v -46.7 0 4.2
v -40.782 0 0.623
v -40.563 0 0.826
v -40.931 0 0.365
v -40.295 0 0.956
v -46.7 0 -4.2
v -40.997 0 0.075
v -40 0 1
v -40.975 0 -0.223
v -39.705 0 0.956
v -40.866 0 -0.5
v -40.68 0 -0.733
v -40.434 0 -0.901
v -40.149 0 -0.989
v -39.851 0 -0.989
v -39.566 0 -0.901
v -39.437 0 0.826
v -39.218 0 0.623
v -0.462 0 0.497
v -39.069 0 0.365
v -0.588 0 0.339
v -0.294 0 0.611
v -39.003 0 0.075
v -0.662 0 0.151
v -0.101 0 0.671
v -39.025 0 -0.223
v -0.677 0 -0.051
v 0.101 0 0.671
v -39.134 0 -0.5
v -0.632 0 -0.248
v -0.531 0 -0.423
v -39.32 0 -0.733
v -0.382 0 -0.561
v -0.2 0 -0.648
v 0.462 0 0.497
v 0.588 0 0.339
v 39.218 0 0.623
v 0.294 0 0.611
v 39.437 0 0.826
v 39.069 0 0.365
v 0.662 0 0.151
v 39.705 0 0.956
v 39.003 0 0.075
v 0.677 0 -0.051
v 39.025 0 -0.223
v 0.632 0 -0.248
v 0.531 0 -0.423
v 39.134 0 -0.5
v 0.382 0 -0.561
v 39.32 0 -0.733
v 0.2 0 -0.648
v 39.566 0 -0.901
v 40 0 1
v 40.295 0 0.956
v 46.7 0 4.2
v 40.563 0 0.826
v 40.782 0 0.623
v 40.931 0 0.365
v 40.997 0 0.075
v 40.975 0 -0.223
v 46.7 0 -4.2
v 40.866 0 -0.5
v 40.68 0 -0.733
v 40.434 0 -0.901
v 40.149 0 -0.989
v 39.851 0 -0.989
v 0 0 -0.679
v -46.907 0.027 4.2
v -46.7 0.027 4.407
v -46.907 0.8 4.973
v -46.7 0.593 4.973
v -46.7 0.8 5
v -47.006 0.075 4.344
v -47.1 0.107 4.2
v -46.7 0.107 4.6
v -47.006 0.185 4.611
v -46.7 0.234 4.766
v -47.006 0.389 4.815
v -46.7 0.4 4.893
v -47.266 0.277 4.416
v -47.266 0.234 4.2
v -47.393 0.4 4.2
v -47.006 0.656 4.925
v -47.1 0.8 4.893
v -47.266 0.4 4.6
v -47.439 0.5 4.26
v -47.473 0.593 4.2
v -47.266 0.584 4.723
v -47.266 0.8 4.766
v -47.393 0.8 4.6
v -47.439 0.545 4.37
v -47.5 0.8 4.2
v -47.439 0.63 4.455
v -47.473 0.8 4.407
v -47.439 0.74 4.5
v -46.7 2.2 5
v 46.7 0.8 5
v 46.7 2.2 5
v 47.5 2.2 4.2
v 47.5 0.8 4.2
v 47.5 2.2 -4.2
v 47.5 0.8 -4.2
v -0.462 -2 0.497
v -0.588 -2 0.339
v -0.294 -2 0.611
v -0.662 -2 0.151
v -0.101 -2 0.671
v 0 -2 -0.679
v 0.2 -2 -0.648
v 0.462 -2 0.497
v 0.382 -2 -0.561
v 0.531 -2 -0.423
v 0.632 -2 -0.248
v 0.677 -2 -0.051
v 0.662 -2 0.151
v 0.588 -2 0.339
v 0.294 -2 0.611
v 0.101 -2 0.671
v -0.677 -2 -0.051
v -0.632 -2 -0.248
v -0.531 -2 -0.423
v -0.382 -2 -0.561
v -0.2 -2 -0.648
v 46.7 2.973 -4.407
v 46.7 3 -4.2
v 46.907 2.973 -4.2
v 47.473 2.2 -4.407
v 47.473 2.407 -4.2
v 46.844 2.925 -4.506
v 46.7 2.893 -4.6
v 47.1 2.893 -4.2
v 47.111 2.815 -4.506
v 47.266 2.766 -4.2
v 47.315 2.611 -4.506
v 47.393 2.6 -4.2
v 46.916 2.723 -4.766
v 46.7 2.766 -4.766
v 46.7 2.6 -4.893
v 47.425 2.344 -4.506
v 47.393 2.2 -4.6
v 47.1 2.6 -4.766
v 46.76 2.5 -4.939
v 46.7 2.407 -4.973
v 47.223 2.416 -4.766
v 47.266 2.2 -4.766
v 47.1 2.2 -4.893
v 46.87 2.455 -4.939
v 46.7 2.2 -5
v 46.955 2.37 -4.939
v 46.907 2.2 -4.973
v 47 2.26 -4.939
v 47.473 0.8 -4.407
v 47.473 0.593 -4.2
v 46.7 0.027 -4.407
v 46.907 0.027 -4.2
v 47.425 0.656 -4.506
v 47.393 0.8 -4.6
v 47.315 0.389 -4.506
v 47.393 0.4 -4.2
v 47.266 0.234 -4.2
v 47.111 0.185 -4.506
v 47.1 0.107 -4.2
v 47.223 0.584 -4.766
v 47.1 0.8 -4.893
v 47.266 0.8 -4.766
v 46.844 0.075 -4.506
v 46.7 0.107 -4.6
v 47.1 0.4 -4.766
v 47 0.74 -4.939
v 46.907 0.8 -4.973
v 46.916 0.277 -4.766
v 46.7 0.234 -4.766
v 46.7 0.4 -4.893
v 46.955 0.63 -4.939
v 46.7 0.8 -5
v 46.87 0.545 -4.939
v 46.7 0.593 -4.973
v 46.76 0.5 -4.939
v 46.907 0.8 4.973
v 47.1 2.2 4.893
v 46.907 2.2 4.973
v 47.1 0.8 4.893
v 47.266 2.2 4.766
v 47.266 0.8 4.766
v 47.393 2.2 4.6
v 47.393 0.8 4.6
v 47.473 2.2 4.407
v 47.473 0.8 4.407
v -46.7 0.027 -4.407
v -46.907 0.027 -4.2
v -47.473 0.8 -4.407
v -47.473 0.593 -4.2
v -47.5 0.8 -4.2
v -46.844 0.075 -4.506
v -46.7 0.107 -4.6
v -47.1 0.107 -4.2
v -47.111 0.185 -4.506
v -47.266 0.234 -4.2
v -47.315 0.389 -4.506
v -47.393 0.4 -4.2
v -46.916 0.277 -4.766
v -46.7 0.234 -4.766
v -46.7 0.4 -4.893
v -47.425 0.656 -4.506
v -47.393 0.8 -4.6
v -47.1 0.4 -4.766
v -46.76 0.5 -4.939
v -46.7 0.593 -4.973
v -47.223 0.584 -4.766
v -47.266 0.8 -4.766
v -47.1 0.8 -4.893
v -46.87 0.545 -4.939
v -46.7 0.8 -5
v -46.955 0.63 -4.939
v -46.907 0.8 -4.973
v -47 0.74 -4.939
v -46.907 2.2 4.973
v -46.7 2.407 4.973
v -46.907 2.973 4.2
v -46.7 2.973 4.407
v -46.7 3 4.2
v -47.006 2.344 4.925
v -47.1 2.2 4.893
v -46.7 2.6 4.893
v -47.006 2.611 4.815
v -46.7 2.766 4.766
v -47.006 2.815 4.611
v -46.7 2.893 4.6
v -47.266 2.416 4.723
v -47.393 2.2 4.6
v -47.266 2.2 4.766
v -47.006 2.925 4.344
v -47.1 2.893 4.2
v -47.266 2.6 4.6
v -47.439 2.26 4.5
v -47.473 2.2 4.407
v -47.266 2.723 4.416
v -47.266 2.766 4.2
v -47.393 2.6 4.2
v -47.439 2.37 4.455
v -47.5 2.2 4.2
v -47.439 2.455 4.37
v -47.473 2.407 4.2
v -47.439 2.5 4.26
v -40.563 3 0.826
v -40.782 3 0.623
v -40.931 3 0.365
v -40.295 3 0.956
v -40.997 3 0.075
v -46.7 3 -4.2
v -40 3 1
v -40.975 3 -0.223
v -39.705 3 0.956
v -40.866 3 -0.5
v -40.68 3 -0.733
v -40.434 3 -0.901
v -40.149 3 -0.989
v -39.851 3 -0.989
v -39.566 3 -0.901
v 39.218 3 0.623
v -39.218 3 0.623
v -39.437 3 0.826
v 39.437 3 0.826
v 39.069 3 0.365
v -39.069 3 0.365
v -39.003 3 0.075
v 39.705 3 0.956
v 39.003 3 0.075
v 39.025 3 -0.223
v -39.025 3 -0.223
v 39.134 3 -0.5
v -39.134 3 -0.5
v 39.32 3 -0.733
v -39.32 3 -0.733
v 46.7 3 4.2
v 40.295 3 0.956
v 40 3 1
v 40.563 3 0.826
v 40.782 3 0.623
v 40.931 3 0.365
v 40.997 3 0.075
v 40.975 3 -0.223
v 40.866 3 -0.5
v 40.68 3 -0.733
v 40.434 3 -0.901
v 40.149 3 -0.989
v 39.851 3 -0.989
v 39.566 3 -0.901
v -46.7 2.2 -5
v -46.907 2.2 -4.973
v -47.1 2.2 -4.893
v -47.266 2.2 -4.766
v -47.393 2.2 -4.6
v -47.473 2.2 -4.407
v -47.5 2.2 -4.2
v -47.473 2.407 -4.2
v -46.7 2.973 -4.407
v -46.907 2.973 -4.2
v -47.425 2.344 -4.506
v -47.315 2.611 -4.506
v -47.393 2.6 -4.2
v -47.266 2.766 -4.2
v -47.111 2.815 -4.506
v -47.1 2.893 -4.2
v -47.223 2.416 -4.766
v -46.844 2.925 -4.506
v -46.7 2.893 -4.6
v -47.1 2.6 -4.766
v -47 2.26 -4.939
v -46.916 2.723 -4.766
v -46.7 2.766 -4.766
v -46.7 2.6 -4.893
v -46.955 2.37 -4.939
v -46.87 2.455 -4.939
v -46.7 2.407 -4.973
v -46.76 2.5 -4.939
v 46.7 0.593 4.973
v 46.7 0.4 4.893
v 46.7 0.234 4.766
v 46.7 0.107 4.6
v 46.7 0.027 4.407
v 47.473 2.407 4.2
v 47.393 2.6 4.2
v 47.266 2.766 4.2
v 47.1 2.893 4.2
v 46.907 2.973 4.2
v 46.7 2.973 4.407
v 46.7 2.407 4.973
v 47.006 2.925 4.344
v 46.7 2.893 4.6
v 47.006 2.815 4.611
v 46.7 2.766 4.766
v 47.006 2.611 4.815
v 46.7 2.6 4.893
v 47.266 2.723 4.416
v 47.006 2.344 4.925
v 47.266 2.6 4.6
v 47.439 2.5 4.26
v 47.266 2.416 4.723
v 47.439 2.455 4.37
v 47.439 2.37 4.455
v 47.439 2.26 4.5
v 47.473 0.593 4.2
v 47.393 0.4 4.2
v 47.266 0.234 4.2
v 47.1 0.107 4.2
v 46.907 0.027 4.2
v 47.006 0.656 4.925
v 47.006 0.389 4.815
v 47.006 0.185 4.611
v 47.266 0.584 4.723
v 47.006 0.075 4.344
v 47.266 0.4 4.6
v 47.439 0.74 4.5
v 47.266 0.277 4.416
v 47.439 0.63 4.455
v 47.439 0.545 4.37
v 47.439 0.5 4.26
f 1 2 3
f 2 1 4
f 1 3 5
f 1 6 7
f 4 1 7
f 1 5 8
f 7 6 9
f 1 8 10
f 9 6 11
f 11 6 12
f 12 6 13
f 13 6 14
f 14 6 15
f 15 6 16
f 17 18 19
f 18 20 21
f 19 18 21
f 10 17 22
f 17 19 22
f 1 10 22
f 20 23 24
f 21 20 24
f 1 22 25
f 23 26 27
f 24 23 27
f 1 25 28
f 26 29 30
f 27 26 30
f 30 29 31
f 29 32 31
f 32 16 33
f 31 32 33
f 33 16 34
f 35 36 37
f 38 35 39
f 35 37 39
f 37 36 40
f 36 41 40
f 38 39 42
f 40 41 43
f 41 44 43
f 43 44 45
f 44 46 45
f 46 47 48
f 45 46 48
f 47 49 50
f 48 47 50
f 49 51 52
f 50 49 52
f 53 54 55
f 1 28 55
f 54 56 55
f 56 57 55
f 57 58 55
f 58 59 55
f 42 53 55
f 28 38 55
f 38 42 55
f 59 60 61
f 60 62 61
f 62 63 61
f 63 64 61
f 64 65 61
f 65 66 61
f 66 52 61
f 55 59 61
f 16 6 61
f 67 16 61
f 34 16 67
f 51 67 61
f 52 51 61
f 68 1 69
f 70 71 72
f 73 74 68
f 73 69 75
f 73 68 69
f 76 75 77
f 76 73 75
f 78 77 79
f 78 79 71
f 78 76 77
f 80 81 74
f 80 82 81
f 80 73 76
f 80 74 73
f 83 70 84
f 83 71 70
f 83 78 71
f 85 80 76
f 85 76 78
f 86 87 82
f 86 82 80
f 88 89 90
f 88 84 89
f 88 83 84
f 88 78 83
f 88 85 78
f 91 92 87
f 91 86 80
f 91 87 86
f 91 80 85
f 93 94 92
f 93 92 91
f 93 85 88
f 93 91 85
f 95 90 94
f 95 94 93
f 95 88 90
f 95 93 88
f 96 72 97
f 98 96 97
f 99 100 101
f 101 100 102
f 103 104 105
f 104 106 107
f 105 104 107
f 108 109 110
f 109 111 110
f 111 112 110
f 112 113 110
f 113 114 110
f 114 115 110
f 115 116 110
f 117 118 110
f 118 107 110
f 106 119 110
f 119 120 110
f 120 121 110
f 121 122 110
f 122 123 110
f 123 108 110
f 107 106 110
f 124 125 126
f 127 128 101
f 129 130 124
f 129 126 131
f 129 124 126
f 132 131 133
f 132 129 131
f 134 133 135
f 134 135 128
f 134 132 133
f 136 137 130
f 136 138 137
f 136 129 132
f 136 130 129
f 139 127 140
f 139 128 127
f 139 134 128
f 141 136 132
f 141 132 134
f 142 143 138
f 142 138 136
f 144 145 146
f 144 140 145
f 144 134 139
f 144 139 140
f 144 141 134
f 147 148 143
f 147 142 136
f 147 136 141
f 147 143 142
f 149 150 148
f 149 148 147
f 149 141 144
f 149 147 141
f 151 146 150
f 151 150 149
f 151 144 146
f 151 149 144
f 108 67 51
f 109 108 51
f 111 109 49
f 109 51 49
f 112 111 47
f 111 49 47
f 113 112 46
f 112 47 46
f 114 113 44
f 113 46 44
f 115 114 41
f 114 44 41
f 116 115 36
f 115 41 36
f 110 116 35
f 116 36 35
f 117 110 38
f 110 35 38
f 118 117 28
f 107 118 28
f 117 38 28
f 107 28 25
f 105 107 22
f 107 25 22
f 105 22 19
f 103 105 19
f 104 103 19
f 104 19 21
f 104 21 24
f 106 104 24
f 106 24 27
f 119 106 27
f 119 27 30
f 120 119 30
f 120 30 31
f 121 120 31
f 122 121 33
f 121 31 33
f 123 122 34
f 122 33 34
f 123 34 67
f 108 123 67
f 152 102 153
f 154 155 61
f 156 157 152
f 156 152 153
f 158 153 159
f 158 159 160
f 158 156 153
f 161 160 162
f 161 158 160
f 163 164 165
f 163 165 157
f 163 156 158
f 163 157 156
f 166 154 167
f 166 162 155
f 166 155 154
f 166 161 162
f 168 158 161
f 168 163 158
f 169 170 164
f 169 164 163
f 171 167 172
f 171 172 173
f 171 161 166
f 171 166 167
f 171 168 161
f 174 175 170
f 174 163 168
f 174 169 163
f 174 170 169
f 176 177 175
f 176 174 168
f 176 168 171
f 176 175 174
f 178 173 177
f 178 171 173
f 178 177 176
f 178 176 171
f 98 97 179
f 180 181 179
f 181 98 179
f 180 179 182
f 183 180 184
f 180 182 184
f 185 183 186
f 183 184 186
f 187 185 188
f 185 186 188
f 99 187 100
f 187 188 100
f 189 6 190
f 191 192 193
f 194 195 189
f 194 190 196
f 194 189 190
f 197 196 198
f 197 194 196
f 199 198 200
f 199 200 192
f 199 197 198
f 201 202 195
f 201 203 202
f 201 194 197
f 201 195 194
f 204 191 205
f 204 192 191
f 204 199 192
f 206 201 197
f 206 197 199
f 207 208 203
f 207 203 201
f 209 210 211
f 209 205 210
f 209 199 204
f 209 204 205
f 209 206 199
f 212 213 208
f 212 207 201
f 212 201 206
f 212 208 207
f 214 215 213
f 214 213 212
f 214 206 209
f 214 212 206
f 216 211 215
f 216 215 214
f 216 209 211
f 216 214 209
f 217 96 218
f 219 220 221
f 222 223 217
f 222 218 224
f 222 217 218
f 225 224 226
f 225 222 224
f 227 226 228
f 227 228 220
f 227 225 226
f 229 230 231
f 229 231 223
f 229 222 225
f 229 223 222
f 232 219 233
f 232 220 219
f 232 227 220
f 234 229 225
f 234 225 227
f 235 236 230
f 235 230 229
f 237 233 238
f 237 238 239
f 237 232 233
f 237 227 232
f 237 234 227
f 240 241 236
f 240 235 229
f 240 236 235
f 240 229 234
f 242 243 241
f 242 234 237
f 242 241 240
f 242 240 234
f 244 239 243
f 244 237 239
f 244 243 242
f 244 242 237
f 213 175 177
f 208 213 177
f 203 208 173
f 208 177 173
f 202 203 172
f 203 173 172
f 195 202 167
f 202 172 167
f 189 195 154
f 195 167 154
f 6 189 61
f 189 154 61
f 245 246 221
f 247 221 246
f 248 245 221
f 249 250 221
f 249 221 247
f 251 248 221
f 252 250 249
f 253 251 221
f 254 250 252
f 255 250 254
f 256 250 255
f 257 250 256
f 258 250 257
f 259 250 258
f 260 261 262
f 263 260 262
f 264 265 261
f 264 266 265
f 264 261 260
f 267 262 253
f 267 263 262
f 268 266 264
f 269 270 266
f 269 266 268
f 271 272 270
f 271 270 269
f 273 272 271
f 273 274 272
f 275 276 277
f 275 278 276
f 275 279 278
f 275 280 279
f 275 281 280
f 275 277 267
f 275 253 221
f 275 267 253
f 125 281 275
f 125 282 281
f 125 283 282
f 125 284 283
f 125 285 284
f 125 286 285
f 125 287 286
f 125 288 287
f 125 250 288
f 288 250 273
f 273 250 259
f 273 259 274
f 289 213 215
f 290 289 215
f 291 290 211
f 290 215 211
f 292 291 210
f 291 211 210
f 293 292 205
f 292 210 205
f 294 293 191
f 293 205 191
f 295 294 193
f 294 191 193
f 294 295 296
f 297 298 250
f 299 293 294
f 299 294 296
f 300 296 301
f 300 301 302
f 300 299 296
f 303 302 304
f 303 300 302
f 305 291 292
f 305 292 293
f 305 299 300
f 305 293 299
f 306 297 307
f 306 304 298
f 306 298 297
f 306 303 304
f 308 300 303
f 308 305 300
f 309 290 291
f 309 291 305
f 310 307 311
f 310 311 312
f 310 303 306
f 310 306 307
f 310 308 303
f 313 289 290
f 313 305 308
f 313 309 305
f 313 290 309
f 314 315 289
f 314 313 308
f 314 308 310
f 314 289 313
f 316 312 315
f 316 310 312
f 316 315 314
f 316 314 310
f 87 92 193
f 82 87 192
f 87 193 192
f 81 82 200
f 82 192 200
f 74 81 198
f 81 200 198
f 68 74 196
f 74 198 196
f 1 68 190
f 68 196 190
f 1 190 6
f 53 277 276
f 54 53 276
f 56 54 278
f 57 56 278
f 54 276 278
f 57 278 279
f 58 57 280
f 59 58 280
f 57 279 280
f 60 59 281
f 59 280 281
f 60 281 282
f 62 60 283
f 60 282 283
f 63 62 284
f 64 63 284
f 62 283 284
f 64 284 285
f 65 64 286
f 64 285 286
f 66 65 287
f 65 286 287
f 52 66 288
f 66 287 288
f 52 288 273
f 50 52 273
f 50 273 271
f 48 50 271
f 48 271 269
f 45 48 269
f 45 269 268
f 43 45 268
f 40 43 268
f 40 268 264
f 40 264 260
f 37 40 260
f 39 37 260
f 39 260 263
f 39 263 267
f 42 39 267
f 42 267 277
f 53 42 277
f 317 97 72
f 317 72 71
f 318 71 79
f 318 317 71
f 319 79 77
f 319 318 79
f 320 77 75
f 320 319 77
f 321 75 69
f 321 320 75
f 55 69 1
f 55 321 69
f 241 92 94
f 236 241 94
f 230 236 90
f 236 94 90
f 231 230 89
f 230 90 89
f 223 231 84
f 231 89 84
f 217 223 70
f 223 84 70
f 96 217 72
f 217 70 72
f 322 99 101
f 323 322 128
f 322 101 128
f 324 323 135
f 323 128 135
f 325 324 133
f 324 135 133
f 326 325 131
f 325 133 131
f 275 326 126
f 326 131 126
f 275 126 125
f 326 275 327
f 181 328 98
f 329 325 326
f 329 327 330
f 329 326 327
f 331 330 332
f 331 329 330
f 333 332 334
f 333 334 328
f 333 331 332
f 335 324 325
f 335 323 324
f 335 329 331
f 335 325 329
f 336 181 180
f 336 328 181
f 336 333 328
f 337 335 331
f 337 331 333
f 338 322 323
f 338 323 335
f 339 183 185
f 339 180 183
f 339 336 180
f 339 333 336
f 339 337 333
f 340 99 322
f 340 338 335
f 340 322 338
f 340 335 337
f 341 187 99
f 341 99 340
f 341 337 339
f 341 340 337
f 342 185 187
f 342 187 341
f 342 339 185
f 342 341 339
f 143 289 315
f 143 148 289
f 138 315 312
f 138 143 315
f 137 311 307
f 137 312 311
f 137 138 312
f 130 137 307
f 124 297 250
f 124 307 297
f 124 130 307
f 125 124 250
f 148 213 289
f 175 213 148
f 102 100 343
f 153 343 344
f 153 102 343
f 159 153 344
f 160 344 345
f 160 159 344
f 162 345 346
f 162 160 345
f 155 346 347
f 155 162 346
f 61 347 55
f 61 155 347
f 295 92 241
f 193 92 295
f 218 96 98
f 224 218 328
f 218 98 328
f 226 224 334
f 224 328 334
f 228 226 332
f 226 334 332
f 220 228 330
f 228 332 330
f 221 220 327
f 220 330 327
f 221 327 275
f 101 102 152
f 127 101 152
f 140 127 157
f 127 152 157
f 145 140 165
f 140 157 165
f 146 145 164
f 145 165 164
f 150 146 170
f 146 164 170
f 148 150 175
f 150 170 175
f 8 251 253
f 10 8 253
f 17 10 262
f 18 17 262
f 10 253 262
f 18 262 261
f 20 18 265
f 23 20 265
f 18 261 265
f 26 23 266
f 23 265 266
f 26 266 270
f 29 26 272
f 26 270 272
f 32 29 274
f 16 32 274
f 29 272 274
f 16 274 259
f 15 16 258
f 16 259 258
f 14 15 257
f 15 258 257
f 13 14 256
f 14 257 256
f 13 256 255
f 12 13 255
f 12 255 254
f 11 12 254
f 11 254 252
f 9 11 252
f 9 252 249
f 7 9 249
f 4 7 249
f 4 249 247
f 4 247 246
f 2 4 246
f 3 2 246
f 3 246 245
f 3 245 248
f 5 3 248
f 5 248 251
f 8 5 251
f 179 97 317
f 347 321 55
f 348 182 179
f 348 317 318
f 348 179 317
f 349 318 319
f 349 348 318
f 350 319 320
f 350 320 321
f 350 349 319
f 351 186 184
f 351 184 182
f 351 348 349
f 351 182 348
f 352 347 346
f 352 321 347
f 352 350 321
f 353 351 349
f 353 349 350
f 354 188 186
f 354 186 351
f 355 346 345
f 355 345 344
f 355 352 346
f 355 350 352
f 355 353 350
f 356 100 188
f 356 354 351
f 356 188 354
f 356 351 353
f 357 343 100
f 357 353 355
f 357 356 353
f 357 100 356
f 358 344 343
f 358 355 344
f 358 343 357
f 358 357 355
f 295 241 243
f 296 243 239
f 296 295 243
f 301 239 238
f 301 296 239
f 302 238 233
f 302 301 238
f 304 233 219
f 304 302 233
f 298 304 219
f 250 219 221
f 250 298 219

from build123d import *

# Parameters (mm, degrees)
SKETCH1_W           = 95
SKETCH1_H           = 10
BOSS_EXTRUDE1_DEPTH = 3
FILLET1_R           = 0.8
FILLET2_R           = 0.8
SKETCH2_R           = 1
CUT_EXTRUDE1_DEPTH  = 48.8565565
SKETCH3_R           = 1
BOSS_EXTRUDE2_DEPTH = 5
CUT_EXTRUDE3_START  = -2
SKETCH4_R           = 1
SKETCH4_R_2         = 0.678596162
CUT_EXTRUDE3_DEPTH  = 2


with BuildPart() as part:
    # Sketch1 → Boss-Extrude1 (new body)
    with BuildSketch(Plane(origin=(0, 0, 0), x_dir=(1, 0, 0), z_dir=(0, 1, 0))):
        Rectangle(SKETCH1_W, SKETCH1_H)
    extrude(amount=BOSS_EXTRUDE1_DEPTH)

    # Fillet1
    fillet1_edges = [part.edges().sort_by_distance(p)[0] for p in [
        (-47.5, 3, 0),
        (0, 3, 5),
        (47.5, 3, 0),
        (0, 0, 5),
        (-47.5, 0, 0),
        (0, 0, -5),
        (47.5, 0, 0),
        (0, 3, -5),
    ]]
    fillet(fillet1_edges, radius=FILLET1_R)

    # Fillet2
    # the kernel refuses this fillet: 0.8 mm, written as the material it takes off along each edge
    with BuildSketch(Plane(origin=(46.7, 0.8, 4.2), x_dir=(0, 0, 1), z_dir=(1, 0, 0))) as fillet2_piece_1_section:
        Polygon((0, 0), (FILLET2_R, 0), (FILLET2_R, FILLET2_R), (0, FILLET2_R), align=None)
    fillet2_piece_1 = extrude(amount=FILLET2_R, mode=Mode.PRIVATE)
    fillet2_piece_1 = fillet2_piece_1 - Plane(origin=(46.7, 0.8, 4.2), x_dir=(0, 0.7071067811865475, -0.7071067811865475), z_dir=(1, 0, 0)) * Sphere(FILLET2_R, mode=Mode.PRIVATE)
    add(fillet2_piece_1, mode=Mode.SUBTRACT)
    with BuildSketch(Plane(origin=(-46.7, 0.8, 4.2), x_dir=(0, 0, 1), z_dir=(-1, 0, 0))) as fillet2_piece_2_section:
        Polygon((0, 0), (FILLET2_R, 0), (FILLET2_R, -FILLET2_R), (0, -FILLET2_R), align=None)
    fillet2_piece_2 = extrude(amount=FILLET2_R, mode=Mode.PRIVATE)
    fillet2_piece_2 = fillet2_piece_2 - Plane(origin=(-46.7, 0.8, 4.2), x_dir=(0, 0.7071067811865475, -0.7071067811865475), z_dir=(-1, 0, 0)) * Sphere(FILLET2_R, mode=Mode.PRIVATE)
    add(fillet2_piece_2, mode=Mode.SUBTRACT)
    with BuildSketch(Plane(origin=(46.7, 0.8, -4.2), x_dir=(1, 0, 0), z_dir=(0, 0, -1))) as fillet2_piece_3_section:
        Polygon((0, 0), (FILLET2_R, 0), (FILLET2_R, FILLET2_R), (0, FILLET2_R), align=None)
    fillet2_piece_3 = extrude(amount=FILLET2_R, mode=Mode.PRIVATE)
    fillet2_piece_3 = fillet2_piece_3 - Plane(origin=(46.7, 0.8, -4.2), x_dir=(-0.7071067811865475, 0.7071067811865475, 0), z_dir=(0, 0, -1)) * Sphere(FILLET2_R, mode=Mode.PRIVATE)
    add(fillet2_piece_3, mode=Mode.SUBTRACT)
    with BuildSketch(Plane(origin=(-46.7, 0.8, -4.2), x_dir=(-1, 0, 0), z_dir=(0, 0, -1))) as fillet2_piece_4_section:
        Polygon((0, 0), (FILLET2_R, 0), (FILLET2_R, -FILLET2_R), (0, -FILLET2_R), align=None)
    fillet2_piece_4 = extrude(amount=FILLET2_R, mode=Mode.PRIVATE)
    fillet2_piece_4 = fillet2_piece_4 - Plane(origin=(-46.7, 0.8, -4.2), x_dir=(0.7071067811865475, 0.7071067811865475, 0), z_dir=(0, 0, -1)) * Sphere(FILLET2_R, mode=Mode.PRIVATE)
    add(fillet2_piece_4, mode=Mode.SUBTRACT)
    with BuildSketch(Plane(origin=(-46.7, 2.2, -4.2), x_dir=(-1, 0, 0), z_dir=(0, 0, -1))) as fillet2_piece_5_section:
        Polygon((0, 0), (FILLET2_R, 0), (FILLET2_R, FILLET2_R), (0, FILLET2_R), align=None)
    fillet2_piece_5 = extrude(amount=FILLET2_R, mode=Mode.PRIVATE)
    fillet2_piece_5 = fillet2_piece_5 - Plane(origin=(-46.7, 2.2, -4.2), x_dir=(0.7071067811865475, -0.7071067811865475, 0), z_dir=(0, 0, -1)) * Sphere(FILLET2_R, mode=Mode.PRIVATE)
    add(fillet2_piece_5, mode=Mode.SUBTRACT)
    with BuildSketch(Plane(origin=(46.7, 2.2, -4.2), x_dir=(1, 0, 0), z_dir=(0, 0, -1))) as fillet2_piece_6_section:
        Polygon((0, 0), (FILLET2_R, 0), (FILLET2_R, -FILLET2_R), (0, -FILLET2_R), align=None)
    fillet2_piece_6 = extrude(amount=FILLET2_R, mode=Mode.PRIVATE)
    fillet2_piece_6 = fillet2_piece_6 - Plane(origin=(46.7, 2.2, -4.2), x_dir=(-0.7071067811865475, -0.7071067811865475, 0), z_dir=(0, 0, -1)) * Sphere(FILLET2_R, mode=Mode.PRIVATE)
    add(fillet2_piece_6, mode=Mode.SUBTRACT)
    with BuildSketch(Plane(origin=(-46.7, 2.2, 4.2), x_dir=(0, 0, 1), z_dir=(-1, 0, 0))) as fillet2_piece_7_section:
        Polygon((0, 0), (FILLET2_R, 0), (FILLET2_R, FILLET2_R), (0, FILLET2_R), align=None)
    fillet2_piece_7 = extrude(amount=FILLET2_R, mode=Mode.PRIVATE)
    fillet2_piece_7 = fillet2_piece_7 - Plane(origin=(-46.7, 2.2, 4.2), x_dir=(0, -0.7071067811865475, -0.7071067811865475), z_dir=(-1, 0, 0)) * Sphere(FILLET2_R, mode=Mode.PRIVATE)
    add(fillet2_piece_7, mode=Mode.SUBTRACT)
    with BuildSketch(Plane(origin=(46.7, 2.2, 4.2), x_dir=(0, 0, 1), z_dir=(1, 0, 0))) as fillet2_piece_8_section:
        Polygon((0, 0), (FILLET2_R, 0), (FILLET2_R, -FILLET2_R), (0, -FILLET2_R), align=None)
    fillet2_piece_8 = extrude(amount=FILLET2_R, mode=Mode.PRIVATE)
    fillet2_piece_8 = fillet2_piece_8 - Plane(origin=(46.7, 2.2, 4.2), x_dir=(0, -0.7071067811865475, -0.7071067811865475), z_dir=(1, 0, 0)) * Sphere(FILLET2_R, mode=Mode.PRIVATE)
    add(fillet2_piece_8, mode=Mode.SUBTRACT)
    with BuildSketch(Plane(origin=(-47.5, 0.8, -5), x_dir=(1, 0, 0), z_dir=(0, 1, 0)), Plane(origin=(-47.5, 0.8, 5), x_dir=(0, 0, -1), z_dir=(0, 1, 0))) as fillet2_piece_9:
        with BuildLine():
            CenterArc((FILLET2_R, -FILLET2_R), FILLET2_R, 90, 90)
            Line((0, -FILLET2_R), (0, 0))
            Line((0, 0), (FILLET2_R, 0))
        make_face()
    extrude(amount=1.4, mode=Mode.SUBTRACT)
    with BuildSketch(Plane(origin=(47.5, 0.8, -5), x_dir=(-1, 0, 0), z_dir=(0, 1, 0)), Plane(origin=(47.5, 0.8, 5), x_dir=(0, 0, -1), z_dir=(0, 1, 0))) as fillet2_piece_10:
        with BuildLine():
            CenterArc((FILLET2_R, FILLET2_R), FILLET2_R, 180, 90)
            Line((0, FILLET2_R), (0, 0))
            Line((0, 0), (FILLET2_R, 0))
        make_face()
    extrude(amount=1.4, mode=Mode.SUBTRACT)

    # Sketch2 → Cut-Extrude1 (cut, through all)
    with BuildSketch(Plane(origin=(0, 3, 0), x_dir=(1, 0, 0), z_dir=(0, 1, 0))):
        with Locations(Location((0, 0, 0), (0, 0, 270))):
            Circle(SKETCH2_R)
        with Locations(Location((-40, 0, 0), (0, 0, 270))):
            Circle(SKETCH2_R)
        with Locations(Location((40, 0, 0), (0, 0, 270))):
            Circle(SKETCH2_R)
    extrude(amount=-CUT_EXTRUDE1_DEPTH, mode=Mode.SUBTRACT)

    # Sketch3 → Boss-Extrude2 (add)
    with BuildSketch(Plane(origin=(0, 3, 0), x_dir=(1, 0, 0), z_dir=(0, 1, 0))):
        with Locations(Location((0, 0, 0), (0, 0, 270))):
            Circle(SKETCH3_R)
    extrude(amount=-BOSS_EXTRUDE2_DEPTH)

    # Sketch4 → Cut-Extrude3 (cut)
    with BuildSketch(Plane.XZ.offset(2).offset(CUT_EXTRUDE3_START)):
        Circle(SKETCH4_R)
        with Locations(Location((0, 0, 0), (0, 0, 270))):
            Circle(SKETCH4_R_2, mode=Mode.SUBTRACT)
    extrude(amount=CUT_EXTRUDE3_DEPTH, mode=Mode.SUBTRACT)


solid = part.part
